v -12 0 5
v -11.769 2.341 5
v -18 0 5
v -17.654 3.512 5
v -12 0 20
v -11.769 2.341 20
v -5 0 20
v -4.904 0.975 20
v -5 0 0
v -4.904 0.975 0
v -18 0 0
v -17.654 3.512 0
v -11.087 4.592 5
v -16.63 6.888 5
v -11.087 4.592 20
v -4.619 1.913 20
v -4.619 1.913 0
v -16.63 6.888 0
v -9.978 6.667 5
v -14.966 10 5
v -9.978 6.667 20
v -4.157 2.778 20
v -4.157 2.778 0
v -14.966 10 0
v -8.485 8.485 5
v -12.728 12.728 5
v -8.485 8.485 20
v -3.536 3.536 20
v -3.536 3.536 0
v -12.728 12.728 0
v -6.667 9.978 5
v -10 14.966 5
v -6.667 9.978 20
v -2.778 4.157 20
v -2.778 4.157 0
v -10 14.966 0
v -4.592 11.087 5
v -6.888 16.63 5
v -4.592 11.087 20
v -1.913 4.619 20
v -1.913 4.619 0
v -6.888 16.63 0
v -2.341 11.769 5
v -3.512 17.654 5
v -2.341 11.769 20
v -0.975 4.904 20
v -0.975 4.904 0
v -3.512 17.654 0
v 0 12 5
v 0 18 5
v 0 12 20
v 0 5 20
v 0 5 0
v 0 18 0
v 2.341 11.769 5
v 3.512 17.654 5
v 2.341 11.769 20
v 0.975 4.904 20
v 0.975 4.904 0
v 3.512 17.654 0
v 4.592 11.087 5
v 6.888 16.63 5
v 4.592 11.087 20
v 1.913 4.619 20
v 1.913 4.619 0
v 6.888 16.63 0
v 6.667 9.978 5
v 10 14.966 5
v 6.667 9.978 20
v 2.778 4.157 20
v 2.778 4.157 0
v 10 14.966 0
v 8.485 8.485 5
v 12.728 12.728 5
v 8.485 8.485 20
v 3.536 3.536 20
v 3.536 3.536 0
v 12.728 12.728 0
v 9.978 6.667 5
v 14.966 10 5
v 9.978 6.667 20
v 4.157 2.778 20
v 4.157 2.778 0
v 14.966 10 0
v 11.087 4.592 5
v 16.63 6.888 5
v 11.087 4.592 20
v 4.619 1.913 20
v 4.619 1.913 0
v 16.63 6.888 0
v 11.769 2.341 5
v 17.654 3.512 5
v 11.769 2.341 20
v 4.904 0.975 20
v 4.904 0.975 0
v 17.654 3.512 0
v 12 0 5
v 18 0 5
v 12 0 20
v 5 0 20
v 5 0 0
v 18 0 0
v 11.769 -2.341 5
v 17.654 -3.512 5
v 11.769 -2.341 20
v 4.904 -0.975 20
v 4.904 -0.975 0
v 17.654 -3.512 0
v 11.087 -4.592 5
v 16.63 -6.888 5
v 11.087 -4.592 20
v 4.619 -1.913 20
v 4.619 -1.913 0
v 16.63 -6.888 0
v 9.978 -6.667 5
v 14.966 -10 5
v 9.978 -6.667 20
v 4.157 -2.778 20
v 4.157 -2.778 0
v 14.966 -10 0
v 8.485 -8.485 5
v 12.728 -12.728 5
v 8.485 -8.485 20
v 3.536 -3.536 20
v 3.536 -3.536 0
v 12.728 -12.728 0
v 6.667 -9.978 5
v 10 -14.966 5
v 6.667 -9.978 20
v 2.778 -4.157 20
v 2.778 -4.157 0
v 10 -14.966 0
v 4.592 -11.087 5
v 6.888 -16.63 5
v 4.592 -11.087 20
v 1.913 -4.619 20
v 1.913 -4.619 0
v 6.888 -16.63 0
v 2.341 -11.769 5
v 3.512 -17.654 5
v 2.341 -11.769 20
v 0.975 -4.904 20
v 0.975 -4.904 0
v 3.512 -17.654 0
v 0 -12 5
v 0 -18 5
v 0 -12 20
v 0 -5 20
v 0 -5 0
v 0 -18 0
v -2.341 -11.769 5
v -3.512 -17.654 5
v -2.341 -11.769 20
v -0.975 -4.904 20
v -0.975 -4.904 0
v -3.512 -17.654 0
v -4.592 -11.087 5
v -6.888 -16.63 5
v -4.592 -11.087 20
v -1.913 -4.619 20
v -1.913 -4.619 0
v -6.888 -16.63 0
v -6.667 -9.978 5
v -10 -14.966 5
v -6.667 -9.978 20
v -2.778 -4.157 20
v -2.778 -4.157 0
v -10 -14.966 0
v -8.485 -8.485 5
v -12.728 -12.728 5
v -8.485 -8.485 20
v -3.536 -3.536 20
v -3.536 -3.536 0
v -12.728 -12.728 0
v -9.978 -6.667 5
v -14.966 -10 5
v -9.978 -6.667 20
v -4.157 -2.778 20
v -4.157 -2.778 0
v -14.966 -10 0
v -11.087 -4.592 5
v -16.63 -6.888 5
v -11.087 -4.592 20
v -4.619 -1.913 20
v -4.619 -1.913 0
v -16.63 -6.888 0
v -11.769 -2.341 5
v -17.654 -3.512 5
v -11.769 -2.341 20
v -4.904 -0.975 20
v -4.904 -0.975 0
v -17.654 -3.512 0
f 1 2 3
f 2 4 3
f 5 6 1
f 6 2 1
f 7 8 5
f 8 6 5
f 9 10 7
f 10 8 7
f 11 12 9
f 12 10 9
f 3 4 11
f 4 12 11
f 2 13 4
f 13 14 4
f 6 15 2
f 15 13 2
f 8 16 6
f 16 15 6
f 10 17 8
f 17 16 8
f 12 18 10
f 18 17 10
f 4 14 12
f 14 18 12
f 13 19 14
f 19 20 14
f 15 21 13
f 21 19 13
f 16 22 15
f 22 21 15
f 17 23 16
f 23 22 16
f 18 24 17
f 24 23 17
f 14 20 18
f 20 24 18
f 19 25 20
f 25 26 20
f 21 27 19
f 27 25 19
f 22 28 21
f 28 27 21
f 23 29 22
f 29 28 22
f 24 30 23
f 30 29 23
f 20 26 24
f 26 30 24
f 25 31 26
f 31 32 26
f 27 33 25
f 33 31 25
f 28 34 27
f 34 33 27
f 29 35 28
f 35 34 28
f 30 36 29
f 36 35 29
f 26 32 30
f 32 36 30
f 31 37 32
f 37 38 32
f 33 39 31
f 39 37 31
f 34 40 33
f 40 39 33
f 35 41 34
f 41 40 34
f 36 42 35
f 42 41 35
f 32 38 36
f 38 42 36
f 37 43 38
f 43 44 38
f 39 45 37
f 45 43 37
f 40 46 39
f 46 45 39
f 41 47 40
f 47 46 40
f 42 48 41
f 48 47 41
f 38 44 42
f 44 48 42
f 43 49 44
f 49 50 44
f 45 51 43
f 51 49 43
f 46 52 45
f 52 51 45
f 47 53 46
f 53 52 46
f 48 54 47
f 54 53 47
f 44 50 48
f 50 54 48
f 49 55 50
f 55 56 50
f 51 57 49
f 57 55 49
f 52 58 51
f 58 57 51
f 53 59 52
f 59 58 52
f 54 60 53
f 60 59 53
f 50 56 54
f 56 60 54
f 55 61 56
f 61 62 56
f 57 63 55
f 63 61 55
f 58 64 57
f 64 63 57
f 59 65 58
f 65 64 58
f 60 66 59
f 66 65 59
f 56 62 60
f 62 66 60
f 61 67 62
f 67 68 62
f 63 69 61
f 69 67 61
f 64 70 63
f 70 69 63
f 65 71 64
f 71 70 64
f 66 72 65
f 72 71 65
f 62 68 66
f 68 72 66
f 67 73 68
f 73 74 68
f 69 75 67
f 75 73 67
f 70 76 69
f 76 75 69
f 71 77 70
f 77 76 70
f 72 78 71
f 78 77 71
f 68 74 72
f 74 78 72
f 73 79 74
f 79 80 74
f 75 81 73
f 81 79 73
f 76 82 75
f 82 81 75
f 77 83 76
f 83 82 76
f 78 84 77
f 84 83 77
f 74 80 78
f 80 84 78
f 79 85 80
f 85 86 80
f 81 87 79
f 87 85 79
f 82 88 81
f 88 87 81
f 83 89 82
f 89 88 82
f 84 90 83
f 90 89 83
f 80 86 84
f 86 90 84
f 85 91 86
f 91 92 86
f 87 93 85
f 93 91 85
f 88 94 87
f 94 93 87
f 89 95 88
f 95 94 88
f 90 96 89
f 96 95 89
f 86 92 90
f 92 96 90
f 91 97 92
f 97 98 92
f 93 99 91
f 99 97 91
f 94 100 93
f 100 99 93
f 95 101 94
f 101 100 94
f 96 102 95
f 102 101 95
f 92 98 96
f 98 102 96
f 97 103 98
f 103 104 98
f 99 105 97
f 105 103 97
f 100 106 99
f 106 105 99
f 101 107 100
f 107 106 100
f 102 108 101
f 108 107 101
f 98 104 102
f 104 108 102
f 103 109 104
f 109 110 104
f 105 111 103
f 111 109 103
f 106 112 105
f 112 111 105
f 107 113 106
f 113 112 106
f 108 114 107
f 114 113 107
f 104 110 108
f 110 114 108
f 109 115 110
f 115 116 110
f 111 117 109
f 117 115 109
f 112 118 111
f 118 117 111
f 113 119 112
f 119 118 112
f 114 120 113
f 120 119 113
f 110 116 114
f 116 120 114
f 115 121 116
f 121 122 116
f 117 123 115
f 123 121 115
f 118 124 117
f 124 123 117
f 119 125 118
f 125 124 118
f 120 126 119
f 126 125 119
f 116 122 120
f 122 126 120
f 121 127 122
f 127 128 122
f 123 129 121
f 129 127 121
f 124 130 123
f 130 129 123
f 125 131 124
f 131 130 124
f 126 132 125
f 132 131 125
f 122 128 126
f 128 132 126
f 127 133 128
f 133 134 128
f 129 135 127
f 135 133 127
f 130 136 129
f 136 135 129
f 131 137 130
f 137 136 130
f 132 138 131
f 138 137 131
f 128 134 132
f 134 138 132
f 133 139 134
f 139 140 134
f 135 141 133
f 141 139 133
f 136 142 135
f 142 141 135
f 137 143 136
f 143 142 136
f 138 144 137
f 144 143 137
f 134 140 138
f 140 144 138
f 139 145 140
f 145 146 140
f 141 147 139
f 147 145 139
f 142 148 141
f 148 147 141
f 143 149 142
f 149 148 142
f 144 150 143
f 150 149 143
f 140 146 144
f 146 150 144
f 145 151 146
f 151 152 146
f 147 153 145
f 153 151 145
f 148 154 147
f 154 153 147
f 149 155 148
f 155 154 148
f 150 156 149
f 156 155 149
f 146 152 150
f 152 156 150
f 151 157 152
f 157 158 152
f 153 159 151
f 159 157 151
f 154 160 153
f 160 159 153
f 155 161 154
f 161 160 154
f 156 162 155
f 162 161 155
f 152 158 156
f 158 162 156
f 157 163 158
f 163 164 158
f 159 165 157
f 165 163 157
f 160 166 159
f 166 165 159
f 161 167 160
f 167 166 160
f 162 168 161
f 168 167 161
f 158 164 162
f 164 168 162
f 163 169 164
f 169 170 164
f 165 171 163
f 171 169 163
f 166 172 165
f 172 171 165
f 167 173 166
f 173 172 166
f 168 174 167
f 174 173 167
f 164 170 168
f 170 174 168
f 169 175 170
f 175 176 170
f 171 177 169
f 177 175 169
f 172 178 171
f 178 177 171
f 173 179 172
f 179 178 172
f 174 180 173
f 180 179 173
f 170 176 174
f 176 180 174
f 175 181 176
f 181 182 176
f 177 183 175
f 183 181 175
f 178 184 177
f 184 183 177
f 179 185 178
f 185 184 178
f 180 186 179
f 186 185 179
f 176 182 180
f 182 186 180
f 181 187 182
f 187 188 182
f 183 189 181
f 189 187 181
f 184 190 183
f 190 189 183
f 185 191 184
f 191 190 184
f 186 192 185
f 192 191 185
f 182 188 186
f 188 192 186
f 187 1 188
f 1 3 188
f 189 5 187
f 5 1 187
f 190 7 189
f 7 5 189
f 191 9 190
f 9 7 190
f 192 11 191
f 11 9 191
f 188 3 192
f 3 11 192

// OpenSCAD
$fn = 32;

// ----------------------------------------------------------------------
// Revolved part: flanged bushing R18
// ----------------------------------------------------------------------

// --- parameters (mm) ---
bore_r = 5;               // bore radius
flange_r = 18;            // flange radius
flange_h = 5;             // flange thickness
sleeve_r = 12;            // sleeve radius
total_h = 20;             // overall height
revolve_angle = 360;      // revolve sweep, degrees

bore_d = 2 * bore_r;
flange_d = 2 * flange_r;
sleeve_d = 2 * sleeve_r;

profile = [[5, 0], [18, 0], [18, 5], [12, 5], [12, 20], [5, 20]];  // primary outline, 6 points, counter clockwise

// --- the one profile operation ---
rotate_extrude(angle = revolve_angle) polygon(points = profile);
